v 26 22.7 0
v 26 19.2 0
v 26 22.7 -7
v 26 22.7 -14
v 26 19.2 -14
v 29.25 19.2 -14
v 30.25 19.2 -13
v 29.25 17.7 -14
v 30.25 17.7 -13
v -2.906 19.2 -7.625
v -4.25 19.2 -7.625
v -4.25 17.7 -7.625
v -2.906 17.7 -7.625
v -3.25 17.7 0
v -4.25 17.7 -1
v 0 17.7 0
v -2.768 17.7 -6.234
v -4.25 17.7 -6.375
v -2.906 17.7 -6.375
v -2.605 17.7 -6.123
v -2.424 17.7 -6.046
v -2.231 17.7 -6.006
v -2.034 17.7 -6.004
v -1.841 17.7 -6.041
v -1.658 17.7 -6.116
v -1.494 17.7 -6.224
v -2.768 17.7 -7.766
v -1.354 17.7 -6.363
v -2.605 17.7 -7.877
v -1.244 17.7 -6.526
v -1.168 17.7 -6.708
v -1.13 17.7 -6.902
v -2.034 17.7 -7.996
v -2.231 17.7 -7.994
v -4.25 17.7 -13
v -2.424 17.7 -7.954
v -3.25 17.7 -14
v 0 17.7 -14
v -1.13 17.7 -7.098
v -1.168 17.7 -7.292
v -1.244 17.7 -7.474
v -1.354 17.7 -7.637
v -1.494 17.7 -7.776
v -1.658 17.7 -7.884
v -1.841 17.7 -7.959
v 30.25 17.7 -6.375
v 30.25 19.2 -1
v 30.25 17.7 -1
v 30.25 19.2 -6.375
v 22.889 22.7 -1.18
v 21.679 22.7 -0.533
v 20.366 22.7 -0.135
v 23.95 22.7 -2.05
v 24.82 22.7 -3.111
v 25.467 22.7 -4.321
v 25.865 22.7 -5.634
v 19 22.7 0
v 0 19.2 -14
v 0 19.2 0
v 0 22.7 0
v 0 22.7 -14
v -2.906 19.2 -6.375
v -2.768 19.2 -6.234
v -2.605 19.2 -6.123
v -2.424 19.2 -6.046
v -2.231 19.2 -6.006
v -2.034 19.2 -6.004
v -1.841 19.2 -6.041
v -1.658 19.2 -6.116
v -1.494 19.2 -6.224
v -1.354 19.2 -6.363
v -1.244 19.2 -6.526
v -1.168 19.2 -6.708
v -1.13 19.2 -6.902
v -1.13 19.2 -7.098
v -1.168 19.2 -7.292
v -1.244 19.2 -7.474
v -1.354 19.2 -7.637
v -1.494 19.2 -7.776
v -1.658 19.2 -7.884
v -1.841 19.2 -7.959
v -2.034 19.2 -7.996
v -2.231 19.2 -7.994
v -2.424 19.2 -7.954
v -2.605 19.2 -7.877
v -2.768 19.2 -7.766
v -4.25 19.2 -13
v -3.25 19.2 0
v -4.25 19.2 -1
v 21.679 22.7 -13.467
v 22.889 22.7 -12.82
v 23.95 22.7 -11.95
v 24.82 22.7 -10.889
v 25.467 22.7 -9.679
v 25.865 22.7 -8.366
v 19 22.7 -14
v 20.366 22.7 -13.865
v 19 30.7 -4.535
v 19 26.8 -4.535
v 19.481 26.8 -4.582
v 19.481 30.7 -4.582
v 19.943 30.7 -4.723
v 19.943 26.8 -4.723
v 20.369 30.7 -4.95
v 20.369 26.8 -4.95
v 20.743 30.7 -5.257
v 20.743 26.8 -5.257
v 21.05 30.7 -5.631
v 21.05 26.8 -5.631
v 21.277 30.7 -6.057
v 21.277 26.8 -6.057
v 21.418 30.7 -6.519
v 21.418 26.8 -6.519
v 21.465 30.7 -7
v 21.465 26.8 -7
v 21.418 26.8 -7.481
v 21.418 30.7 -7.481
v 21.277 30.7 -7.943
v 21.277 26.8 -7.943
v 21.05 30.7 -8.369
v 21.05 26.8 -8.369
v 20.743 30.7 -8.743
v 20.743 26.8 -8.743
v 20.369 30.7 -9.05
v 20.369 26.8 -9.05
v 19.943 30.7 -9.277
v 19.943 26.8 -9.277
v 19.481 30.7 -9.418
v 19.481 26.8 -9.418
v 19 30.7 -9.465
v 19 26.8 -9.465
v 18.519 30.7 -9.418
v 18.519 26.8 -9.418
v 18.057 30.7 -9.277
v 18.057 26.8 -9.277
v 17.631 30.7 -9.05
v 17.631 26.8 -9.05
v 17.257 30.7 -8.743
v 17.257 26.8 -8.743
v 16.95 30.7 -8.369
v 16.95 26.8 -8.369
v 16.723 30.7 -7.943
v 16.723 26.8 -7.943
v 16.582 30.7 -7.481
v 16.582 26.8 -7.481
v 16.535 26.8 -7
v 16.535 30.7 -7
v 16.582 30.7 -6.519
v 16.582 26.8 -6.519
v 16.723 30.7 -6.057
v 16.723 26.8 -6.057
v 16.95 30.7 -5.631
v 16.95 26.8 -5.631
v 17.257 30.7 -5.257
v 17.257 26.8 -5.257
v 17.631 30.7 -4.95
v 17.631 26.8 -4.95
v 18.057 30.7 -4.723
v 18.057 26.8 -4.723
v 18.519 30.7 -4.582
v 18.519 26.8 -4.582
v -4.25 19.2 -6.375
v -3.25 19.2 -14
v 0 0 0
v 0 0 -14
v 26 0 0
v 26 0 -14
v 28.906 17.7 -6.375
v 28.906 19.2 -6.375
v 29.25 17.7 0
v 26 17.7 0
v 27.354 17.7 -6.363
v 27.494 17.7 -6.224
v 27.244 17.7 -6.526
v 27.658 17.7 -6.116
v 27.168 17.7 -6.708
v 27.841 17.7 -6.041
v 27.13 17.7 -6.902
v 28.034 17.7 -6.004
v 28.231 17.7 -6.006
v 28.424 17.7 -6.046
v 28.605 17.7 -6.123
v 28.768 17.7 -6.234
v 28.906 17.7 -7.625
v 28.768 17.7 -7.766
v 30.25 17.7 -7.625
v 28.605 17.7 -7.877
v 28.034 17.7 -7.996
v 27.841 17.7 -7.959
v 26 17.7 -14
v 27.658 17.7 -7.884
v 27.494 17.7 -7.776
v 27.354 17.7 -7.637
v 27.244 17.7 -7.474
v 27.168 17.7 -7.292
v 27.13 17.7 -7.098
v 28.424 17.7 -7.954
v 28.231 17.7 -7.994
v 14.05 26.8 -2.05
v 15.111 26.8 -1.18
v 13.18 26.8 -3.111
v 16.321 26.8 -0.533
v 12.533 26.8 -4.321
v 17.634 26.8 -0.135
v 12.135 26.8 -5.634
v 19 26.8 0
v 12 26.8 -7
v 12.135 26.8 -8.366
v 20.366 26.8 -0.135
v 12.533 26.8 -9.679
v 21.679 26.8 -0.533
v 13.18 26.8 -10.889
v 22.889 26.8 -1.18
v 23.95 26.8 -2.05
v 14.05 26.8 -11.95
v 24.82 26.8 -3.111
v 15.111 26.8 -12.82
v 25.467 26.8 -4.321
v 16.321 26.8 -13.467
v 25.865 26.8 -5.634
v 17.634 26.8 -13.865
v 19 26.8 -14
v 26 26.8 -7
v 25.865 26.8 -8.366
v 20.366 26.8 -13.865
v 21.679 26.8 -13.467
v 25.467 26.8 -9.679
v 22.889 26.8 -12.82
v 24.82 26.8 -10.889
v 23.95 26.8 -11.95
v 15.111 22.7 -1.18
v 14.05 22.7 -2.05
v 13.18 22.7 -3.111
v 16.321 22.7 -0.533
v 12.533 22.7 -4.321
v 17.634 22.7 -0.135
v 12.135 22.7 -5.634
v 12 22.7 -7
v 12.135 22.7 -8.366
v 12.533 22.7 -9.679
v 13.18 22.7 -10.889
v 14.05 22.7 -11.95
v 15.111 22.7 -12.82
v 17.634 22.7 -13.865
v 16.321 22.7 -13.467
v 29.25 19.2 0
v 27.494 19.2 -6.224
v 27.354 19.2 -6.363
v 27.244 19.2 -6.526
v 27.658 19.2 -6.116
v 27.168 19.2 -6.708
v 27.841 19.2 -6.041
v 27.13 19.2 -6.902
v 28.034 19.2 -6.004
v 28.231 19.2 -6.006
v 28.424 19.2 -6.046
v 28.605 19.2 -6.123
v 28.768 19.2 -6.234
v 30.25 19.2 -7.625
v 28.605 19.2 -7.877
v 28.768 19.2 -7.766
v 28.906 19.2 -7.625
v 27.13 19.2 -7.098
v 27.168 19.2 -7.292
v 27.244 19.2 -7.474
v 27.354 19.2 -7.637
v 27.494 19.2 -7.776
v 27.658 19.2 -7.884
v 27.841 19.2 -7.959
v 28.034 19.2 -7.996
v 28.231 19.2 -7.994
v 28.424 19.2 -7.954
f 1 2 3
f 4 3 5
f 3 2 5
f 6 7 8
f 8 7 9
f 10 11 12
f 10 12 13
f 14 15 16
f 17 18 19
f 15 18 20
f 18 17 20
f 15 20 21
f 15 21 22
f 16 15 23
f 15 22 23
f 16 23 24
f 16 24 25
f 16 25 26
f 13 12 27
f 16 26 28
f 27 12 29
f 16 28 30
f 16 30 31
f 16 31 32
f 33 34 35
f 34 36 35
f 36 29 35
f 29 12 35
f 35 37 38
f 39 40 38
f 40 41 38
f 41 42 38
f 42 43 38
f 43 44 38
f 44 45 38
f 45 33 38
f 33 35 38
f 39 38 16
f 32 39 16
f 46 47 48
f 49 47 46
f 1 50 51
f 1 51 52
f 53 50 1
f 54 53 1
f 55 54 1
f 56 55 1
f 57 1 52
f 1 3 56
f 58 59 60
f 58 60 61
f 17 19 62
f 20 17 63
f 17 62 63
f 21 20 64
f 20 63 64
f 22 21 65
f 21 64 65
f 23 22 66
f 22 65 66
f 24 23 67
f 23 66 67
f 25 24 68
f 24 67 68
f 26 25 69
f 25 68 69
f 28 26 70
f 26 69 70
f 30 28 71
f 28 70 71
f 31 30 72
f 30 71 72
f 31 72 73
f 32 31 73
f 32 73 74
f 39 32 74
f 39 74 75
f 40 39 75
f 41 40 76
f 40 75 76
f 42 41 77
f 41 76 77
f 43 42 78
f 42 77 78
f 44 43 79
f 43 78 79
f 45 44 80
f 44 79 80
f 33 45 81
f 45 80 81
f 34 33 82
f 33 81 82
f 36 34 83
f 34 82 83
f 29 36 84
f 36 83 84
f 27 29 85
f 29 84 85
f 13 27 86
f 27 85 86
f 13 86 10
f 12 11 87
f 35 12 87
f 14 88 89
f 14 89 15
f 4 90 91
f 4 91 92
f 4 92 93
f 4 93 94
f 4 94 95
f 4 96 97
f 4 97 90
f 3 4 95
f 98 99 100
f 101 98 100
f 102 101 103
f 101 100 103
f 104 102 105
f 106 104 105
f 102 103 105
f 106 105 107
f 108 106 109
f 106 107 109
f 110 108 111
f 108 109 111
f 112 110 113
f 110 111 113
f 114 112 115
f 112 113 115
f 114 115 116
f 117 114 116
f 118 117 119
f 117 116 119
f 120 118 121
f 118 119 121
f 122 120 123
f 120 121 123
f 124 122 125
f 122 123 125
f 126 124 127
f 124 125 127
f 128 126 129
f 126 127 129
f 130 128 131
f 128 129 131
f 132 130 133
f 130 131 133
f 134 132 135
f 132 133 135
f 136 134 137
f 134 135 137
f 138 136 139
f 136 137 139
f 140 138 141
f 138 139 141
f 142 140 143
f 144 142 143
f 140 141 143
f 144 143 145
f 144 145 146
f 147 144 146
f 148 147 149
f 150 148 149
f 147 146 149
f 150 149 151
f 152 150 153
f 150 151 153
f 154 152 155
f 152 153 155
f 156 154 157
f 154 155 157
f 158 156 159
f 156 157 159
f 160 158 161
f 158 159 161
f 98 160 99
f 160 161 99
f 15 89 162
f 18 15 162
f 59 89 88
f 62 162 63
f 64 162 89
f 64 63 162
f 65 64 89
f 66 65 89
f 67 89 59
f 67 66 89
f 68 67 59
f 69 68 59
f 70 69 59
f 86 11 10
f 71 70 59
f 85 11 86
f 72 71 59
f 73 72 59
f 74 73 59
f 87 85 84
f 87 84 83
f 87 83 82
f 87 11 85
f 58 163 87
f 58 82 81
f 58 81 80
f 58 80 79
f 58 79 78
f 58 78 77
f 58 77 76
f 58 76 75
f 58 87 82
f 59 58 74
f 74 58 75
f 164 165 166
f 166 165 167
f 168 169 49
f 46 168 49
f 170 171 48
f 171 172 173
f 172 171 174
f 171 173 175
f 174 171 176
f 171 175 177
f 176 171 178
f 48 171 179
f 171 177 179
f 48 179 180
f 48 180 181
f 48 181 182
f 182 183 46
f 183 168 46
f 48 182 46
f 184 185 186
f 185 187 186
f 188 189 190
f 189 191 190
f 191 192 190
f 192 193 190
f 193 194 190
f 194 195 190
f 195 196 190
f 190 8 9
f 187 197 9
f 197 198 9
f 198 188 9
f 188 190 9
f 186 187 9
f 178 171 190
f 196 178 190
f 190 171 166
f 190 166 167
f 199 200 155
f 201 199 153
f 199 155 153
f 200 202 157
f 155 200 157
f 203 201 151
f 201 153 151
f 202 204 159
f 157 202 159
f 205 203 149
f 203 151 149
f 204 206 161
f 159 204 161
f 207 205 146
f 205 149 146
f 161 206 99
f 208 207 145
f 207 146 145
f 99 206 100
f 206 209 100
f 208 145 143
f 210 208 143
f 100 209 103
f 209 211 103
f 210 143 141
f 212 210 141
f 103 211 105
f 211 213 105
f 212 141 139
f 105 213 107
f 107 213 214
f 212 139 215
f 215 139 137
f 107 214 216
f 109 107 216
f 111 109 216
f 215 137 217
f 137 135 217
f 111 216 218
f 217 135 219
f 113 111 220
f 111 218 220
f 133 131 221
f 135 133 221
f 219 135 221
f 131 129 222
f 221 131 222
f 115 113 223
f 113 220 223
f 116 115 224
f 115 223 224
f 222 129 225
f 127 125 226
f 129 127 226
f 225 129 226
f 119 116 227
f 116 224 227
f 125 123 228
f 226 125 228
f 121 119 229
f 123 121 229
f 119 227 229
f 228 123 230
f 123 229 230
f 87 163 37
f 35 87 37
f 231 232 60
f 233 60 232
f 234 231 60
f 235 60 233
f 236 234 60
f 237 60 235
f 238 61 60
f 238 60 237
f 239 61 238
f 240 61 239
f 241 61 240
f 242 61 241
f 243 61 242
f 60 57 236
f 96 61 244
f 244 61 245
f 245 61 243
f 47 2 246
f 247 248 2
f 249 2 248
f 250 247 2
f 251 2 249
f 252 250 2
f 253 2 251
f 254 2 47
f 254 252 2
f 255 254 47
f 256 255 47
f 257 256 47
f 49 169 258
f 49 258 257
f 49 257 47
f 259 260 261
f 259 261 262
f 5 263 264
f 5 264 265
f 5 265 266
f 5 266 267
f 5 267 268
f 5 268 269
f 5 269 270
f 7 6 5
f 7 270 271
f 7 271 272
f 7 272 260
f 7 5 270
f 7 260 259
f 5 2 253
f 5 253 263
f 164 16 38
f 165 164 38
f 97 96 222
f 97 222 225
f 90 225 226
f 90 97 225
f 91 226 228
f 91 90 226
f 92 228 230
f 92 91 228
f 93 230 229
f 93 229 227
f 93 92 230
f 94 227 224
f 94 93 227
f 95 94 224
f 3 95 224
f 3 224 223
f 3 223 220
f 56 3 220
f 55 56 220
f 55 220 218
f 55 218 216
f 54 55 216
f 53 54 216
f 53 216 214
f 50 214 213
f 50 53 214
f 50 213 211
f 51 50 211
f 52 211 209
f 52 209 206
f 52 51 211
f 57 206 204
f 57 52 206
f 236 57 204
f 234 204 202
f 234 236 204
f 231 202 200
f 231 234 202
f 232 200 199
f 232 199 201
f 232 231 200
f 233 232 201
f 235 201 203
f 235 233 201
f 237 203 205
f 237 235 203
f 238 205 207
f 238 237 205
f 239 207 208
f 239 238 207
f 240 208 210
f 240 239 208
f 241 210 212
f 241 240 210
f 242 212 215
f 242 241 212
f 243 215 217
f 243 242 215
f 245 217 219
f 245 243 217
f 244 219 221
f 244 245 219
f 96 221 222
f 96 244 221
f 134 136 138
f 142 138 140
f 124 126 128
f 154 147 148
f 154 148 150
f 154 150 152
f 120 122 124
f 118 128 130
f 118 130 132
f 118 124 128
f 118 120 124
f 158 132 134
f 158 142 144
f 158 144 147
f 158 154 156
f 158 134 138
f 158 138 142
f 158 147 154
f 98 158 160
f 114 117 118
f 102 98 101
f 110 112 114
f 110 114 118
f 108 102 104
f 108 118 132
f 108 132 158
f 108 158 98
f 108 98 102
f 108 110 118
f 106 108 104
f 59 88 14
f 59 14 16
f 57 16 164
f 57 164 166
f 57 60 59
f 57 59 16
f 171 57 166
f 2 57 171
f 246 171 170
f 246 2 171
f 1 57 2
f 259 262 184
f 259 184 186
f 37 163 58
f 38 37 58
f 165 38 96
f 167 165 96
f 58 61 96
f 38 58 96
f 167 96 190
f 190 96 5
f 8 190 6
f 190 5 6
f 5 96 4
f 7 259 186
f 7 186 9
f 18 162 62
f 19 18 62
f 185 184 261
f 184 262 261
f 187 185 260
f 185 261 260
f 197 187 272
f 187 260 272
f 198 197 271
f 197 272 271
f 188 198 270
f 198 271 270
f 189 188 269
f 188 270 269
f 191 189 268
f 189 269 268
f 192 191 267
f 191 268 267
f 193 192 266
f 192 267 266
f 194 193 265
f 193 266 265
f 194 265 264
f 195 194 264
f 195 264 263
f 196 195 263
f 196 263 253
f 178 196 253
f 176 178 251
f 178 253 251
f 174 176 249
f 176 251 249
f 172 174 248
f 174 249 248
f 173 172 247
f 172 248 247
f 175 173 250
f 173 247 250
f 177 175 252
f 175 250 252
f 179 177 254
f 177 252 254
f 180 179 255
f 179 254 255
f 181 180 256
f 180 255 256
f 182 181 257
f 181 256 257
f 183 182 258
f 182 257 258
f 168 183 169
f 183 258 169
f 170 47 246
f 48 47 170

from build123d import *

# Parameters (mm, degrees)
SKETCH1_W           = 26
SKETCH1_H           = 14
BOSS_EXTRUDE1_DEPTH = 22.7
SKETCH2_W           = 34.5
SKETCH2_H           = 14
BOSS_EXTRUDE2_DEPTH = 1.5
CHAMFER1_SIZE       = 1
SKETCH3_R           = 7
BOSS_EXTRUDE3_DEPTH = 26.8
SKETCH4_R           = 2.465
BOSS_EXTRUDE4_DEPTH = 3.9
SKETCH5_R           = 1
CUT_EXTRUDE1_DEPTH  = 39.466901357
SKETCH7_W           = 4.817382001
SKETCH7_H           = 1.25
SKETCH7_W_2         = 10.544713936
CUT_EXTRUDE2_DEPTH  = 39.466901357


with BuildPart() as part:
    # Sketch1 → Boss-Extrude1 (new body)
    with BuildSketch(Plane(origin=(0, 0, 0), x_dir=(1, 0, 0), z_dir=(0, 1, 0))):
        with Locations((13, 7)):
            Rectangle(SKETCH1_W, SKETCH1_H)
    extrude(amount=BOSS_EXTRUDE1_DEPTH)

    # Sketch2 → Boss-Extrude2 (add)
    with BuildSketch(Plane(origin=(0, 19.2, 0), x_dir=(1, 0, 0), z_dir=(0, 1, 0))):
        with Locations((13, 7)):
            Rectangle(SKETCH2_W, SKETCH2_H)
    extrude(amount=-BOSS_EXTRUDE2_DEPTH)

    # Chamfer1
    chamfer1_edges = [part.edges().sort_by_distance(p)[0] for p in [
        (-4.25, 18.45, -14),
        (30.25, 18.45, 0),
        (-4.25, 18.45, 0),
        (30.25, 18.45, -14),
    ]]
    chamfer(chamfer1_edges, length=CHAMFER1_SIZE)

    # Sketch3 → Boss-Extrude3 (add)
    with BuildSketch(Plane.XZ):
        with Locations(Location((19, -7, 0), (0, 0, 270))):
            Circle(SKETCH3_R)
    extrude(amount=-BOSS_EXTRUDE3_DEPTH)

    # Sketch4 → Boss-Extrude4 (add)
    with BuildSketch(Plane(origin=(0, 26.8, 0), x_dir=(1, 0, 0), z_dir=(0, 1, 0))):
        with Locations(Location((19, 7, 0), (0, 0, 270))):
            Circle(SKETCH4_R)
    extrude(amount=BOSS_EXTRUDE4_DEPTH)

    # Sketch5 → Cut-Extrude1 (cut, through all)
    with BuildSketch(Plane(origin=(0, 19.2, 0), x_dir=(1, 0, 0), z_dir=(0, 1, 0))):
        with Locations(Location((28.125, 7, 0), (0, 0, 270))):
            Circle(SKETCH5_R)
        with Locations(Location((-2.125, 7, 0), (0, 0, 270))):
            Circle(SKETCH5_R)
    extrude(amount=-CUT_EXTRUDE1_DEPTH, mode=Mode.SUBTRACT)

    # Sketch7 → Cut-Extrude2 (cut, through all)
    with BuildSketch(Plane(origin=(0, 19.2, 0), x_dir=(1, 0, 0), z_dir=(0, 1, 0))):
        with Locations((30.431785983, 7)):
            Rectangle(SKETCH7_W, SKETCH7_H)
        with Locations((-7.29545195, 7)):
            Rectangle(SKETCH7_W_2, SKETCH7_H)
    extrude(amount=-CUT_EXTRUDE2_DEPTH, mode=Mode.SUBTRACT)


solid = part.part
